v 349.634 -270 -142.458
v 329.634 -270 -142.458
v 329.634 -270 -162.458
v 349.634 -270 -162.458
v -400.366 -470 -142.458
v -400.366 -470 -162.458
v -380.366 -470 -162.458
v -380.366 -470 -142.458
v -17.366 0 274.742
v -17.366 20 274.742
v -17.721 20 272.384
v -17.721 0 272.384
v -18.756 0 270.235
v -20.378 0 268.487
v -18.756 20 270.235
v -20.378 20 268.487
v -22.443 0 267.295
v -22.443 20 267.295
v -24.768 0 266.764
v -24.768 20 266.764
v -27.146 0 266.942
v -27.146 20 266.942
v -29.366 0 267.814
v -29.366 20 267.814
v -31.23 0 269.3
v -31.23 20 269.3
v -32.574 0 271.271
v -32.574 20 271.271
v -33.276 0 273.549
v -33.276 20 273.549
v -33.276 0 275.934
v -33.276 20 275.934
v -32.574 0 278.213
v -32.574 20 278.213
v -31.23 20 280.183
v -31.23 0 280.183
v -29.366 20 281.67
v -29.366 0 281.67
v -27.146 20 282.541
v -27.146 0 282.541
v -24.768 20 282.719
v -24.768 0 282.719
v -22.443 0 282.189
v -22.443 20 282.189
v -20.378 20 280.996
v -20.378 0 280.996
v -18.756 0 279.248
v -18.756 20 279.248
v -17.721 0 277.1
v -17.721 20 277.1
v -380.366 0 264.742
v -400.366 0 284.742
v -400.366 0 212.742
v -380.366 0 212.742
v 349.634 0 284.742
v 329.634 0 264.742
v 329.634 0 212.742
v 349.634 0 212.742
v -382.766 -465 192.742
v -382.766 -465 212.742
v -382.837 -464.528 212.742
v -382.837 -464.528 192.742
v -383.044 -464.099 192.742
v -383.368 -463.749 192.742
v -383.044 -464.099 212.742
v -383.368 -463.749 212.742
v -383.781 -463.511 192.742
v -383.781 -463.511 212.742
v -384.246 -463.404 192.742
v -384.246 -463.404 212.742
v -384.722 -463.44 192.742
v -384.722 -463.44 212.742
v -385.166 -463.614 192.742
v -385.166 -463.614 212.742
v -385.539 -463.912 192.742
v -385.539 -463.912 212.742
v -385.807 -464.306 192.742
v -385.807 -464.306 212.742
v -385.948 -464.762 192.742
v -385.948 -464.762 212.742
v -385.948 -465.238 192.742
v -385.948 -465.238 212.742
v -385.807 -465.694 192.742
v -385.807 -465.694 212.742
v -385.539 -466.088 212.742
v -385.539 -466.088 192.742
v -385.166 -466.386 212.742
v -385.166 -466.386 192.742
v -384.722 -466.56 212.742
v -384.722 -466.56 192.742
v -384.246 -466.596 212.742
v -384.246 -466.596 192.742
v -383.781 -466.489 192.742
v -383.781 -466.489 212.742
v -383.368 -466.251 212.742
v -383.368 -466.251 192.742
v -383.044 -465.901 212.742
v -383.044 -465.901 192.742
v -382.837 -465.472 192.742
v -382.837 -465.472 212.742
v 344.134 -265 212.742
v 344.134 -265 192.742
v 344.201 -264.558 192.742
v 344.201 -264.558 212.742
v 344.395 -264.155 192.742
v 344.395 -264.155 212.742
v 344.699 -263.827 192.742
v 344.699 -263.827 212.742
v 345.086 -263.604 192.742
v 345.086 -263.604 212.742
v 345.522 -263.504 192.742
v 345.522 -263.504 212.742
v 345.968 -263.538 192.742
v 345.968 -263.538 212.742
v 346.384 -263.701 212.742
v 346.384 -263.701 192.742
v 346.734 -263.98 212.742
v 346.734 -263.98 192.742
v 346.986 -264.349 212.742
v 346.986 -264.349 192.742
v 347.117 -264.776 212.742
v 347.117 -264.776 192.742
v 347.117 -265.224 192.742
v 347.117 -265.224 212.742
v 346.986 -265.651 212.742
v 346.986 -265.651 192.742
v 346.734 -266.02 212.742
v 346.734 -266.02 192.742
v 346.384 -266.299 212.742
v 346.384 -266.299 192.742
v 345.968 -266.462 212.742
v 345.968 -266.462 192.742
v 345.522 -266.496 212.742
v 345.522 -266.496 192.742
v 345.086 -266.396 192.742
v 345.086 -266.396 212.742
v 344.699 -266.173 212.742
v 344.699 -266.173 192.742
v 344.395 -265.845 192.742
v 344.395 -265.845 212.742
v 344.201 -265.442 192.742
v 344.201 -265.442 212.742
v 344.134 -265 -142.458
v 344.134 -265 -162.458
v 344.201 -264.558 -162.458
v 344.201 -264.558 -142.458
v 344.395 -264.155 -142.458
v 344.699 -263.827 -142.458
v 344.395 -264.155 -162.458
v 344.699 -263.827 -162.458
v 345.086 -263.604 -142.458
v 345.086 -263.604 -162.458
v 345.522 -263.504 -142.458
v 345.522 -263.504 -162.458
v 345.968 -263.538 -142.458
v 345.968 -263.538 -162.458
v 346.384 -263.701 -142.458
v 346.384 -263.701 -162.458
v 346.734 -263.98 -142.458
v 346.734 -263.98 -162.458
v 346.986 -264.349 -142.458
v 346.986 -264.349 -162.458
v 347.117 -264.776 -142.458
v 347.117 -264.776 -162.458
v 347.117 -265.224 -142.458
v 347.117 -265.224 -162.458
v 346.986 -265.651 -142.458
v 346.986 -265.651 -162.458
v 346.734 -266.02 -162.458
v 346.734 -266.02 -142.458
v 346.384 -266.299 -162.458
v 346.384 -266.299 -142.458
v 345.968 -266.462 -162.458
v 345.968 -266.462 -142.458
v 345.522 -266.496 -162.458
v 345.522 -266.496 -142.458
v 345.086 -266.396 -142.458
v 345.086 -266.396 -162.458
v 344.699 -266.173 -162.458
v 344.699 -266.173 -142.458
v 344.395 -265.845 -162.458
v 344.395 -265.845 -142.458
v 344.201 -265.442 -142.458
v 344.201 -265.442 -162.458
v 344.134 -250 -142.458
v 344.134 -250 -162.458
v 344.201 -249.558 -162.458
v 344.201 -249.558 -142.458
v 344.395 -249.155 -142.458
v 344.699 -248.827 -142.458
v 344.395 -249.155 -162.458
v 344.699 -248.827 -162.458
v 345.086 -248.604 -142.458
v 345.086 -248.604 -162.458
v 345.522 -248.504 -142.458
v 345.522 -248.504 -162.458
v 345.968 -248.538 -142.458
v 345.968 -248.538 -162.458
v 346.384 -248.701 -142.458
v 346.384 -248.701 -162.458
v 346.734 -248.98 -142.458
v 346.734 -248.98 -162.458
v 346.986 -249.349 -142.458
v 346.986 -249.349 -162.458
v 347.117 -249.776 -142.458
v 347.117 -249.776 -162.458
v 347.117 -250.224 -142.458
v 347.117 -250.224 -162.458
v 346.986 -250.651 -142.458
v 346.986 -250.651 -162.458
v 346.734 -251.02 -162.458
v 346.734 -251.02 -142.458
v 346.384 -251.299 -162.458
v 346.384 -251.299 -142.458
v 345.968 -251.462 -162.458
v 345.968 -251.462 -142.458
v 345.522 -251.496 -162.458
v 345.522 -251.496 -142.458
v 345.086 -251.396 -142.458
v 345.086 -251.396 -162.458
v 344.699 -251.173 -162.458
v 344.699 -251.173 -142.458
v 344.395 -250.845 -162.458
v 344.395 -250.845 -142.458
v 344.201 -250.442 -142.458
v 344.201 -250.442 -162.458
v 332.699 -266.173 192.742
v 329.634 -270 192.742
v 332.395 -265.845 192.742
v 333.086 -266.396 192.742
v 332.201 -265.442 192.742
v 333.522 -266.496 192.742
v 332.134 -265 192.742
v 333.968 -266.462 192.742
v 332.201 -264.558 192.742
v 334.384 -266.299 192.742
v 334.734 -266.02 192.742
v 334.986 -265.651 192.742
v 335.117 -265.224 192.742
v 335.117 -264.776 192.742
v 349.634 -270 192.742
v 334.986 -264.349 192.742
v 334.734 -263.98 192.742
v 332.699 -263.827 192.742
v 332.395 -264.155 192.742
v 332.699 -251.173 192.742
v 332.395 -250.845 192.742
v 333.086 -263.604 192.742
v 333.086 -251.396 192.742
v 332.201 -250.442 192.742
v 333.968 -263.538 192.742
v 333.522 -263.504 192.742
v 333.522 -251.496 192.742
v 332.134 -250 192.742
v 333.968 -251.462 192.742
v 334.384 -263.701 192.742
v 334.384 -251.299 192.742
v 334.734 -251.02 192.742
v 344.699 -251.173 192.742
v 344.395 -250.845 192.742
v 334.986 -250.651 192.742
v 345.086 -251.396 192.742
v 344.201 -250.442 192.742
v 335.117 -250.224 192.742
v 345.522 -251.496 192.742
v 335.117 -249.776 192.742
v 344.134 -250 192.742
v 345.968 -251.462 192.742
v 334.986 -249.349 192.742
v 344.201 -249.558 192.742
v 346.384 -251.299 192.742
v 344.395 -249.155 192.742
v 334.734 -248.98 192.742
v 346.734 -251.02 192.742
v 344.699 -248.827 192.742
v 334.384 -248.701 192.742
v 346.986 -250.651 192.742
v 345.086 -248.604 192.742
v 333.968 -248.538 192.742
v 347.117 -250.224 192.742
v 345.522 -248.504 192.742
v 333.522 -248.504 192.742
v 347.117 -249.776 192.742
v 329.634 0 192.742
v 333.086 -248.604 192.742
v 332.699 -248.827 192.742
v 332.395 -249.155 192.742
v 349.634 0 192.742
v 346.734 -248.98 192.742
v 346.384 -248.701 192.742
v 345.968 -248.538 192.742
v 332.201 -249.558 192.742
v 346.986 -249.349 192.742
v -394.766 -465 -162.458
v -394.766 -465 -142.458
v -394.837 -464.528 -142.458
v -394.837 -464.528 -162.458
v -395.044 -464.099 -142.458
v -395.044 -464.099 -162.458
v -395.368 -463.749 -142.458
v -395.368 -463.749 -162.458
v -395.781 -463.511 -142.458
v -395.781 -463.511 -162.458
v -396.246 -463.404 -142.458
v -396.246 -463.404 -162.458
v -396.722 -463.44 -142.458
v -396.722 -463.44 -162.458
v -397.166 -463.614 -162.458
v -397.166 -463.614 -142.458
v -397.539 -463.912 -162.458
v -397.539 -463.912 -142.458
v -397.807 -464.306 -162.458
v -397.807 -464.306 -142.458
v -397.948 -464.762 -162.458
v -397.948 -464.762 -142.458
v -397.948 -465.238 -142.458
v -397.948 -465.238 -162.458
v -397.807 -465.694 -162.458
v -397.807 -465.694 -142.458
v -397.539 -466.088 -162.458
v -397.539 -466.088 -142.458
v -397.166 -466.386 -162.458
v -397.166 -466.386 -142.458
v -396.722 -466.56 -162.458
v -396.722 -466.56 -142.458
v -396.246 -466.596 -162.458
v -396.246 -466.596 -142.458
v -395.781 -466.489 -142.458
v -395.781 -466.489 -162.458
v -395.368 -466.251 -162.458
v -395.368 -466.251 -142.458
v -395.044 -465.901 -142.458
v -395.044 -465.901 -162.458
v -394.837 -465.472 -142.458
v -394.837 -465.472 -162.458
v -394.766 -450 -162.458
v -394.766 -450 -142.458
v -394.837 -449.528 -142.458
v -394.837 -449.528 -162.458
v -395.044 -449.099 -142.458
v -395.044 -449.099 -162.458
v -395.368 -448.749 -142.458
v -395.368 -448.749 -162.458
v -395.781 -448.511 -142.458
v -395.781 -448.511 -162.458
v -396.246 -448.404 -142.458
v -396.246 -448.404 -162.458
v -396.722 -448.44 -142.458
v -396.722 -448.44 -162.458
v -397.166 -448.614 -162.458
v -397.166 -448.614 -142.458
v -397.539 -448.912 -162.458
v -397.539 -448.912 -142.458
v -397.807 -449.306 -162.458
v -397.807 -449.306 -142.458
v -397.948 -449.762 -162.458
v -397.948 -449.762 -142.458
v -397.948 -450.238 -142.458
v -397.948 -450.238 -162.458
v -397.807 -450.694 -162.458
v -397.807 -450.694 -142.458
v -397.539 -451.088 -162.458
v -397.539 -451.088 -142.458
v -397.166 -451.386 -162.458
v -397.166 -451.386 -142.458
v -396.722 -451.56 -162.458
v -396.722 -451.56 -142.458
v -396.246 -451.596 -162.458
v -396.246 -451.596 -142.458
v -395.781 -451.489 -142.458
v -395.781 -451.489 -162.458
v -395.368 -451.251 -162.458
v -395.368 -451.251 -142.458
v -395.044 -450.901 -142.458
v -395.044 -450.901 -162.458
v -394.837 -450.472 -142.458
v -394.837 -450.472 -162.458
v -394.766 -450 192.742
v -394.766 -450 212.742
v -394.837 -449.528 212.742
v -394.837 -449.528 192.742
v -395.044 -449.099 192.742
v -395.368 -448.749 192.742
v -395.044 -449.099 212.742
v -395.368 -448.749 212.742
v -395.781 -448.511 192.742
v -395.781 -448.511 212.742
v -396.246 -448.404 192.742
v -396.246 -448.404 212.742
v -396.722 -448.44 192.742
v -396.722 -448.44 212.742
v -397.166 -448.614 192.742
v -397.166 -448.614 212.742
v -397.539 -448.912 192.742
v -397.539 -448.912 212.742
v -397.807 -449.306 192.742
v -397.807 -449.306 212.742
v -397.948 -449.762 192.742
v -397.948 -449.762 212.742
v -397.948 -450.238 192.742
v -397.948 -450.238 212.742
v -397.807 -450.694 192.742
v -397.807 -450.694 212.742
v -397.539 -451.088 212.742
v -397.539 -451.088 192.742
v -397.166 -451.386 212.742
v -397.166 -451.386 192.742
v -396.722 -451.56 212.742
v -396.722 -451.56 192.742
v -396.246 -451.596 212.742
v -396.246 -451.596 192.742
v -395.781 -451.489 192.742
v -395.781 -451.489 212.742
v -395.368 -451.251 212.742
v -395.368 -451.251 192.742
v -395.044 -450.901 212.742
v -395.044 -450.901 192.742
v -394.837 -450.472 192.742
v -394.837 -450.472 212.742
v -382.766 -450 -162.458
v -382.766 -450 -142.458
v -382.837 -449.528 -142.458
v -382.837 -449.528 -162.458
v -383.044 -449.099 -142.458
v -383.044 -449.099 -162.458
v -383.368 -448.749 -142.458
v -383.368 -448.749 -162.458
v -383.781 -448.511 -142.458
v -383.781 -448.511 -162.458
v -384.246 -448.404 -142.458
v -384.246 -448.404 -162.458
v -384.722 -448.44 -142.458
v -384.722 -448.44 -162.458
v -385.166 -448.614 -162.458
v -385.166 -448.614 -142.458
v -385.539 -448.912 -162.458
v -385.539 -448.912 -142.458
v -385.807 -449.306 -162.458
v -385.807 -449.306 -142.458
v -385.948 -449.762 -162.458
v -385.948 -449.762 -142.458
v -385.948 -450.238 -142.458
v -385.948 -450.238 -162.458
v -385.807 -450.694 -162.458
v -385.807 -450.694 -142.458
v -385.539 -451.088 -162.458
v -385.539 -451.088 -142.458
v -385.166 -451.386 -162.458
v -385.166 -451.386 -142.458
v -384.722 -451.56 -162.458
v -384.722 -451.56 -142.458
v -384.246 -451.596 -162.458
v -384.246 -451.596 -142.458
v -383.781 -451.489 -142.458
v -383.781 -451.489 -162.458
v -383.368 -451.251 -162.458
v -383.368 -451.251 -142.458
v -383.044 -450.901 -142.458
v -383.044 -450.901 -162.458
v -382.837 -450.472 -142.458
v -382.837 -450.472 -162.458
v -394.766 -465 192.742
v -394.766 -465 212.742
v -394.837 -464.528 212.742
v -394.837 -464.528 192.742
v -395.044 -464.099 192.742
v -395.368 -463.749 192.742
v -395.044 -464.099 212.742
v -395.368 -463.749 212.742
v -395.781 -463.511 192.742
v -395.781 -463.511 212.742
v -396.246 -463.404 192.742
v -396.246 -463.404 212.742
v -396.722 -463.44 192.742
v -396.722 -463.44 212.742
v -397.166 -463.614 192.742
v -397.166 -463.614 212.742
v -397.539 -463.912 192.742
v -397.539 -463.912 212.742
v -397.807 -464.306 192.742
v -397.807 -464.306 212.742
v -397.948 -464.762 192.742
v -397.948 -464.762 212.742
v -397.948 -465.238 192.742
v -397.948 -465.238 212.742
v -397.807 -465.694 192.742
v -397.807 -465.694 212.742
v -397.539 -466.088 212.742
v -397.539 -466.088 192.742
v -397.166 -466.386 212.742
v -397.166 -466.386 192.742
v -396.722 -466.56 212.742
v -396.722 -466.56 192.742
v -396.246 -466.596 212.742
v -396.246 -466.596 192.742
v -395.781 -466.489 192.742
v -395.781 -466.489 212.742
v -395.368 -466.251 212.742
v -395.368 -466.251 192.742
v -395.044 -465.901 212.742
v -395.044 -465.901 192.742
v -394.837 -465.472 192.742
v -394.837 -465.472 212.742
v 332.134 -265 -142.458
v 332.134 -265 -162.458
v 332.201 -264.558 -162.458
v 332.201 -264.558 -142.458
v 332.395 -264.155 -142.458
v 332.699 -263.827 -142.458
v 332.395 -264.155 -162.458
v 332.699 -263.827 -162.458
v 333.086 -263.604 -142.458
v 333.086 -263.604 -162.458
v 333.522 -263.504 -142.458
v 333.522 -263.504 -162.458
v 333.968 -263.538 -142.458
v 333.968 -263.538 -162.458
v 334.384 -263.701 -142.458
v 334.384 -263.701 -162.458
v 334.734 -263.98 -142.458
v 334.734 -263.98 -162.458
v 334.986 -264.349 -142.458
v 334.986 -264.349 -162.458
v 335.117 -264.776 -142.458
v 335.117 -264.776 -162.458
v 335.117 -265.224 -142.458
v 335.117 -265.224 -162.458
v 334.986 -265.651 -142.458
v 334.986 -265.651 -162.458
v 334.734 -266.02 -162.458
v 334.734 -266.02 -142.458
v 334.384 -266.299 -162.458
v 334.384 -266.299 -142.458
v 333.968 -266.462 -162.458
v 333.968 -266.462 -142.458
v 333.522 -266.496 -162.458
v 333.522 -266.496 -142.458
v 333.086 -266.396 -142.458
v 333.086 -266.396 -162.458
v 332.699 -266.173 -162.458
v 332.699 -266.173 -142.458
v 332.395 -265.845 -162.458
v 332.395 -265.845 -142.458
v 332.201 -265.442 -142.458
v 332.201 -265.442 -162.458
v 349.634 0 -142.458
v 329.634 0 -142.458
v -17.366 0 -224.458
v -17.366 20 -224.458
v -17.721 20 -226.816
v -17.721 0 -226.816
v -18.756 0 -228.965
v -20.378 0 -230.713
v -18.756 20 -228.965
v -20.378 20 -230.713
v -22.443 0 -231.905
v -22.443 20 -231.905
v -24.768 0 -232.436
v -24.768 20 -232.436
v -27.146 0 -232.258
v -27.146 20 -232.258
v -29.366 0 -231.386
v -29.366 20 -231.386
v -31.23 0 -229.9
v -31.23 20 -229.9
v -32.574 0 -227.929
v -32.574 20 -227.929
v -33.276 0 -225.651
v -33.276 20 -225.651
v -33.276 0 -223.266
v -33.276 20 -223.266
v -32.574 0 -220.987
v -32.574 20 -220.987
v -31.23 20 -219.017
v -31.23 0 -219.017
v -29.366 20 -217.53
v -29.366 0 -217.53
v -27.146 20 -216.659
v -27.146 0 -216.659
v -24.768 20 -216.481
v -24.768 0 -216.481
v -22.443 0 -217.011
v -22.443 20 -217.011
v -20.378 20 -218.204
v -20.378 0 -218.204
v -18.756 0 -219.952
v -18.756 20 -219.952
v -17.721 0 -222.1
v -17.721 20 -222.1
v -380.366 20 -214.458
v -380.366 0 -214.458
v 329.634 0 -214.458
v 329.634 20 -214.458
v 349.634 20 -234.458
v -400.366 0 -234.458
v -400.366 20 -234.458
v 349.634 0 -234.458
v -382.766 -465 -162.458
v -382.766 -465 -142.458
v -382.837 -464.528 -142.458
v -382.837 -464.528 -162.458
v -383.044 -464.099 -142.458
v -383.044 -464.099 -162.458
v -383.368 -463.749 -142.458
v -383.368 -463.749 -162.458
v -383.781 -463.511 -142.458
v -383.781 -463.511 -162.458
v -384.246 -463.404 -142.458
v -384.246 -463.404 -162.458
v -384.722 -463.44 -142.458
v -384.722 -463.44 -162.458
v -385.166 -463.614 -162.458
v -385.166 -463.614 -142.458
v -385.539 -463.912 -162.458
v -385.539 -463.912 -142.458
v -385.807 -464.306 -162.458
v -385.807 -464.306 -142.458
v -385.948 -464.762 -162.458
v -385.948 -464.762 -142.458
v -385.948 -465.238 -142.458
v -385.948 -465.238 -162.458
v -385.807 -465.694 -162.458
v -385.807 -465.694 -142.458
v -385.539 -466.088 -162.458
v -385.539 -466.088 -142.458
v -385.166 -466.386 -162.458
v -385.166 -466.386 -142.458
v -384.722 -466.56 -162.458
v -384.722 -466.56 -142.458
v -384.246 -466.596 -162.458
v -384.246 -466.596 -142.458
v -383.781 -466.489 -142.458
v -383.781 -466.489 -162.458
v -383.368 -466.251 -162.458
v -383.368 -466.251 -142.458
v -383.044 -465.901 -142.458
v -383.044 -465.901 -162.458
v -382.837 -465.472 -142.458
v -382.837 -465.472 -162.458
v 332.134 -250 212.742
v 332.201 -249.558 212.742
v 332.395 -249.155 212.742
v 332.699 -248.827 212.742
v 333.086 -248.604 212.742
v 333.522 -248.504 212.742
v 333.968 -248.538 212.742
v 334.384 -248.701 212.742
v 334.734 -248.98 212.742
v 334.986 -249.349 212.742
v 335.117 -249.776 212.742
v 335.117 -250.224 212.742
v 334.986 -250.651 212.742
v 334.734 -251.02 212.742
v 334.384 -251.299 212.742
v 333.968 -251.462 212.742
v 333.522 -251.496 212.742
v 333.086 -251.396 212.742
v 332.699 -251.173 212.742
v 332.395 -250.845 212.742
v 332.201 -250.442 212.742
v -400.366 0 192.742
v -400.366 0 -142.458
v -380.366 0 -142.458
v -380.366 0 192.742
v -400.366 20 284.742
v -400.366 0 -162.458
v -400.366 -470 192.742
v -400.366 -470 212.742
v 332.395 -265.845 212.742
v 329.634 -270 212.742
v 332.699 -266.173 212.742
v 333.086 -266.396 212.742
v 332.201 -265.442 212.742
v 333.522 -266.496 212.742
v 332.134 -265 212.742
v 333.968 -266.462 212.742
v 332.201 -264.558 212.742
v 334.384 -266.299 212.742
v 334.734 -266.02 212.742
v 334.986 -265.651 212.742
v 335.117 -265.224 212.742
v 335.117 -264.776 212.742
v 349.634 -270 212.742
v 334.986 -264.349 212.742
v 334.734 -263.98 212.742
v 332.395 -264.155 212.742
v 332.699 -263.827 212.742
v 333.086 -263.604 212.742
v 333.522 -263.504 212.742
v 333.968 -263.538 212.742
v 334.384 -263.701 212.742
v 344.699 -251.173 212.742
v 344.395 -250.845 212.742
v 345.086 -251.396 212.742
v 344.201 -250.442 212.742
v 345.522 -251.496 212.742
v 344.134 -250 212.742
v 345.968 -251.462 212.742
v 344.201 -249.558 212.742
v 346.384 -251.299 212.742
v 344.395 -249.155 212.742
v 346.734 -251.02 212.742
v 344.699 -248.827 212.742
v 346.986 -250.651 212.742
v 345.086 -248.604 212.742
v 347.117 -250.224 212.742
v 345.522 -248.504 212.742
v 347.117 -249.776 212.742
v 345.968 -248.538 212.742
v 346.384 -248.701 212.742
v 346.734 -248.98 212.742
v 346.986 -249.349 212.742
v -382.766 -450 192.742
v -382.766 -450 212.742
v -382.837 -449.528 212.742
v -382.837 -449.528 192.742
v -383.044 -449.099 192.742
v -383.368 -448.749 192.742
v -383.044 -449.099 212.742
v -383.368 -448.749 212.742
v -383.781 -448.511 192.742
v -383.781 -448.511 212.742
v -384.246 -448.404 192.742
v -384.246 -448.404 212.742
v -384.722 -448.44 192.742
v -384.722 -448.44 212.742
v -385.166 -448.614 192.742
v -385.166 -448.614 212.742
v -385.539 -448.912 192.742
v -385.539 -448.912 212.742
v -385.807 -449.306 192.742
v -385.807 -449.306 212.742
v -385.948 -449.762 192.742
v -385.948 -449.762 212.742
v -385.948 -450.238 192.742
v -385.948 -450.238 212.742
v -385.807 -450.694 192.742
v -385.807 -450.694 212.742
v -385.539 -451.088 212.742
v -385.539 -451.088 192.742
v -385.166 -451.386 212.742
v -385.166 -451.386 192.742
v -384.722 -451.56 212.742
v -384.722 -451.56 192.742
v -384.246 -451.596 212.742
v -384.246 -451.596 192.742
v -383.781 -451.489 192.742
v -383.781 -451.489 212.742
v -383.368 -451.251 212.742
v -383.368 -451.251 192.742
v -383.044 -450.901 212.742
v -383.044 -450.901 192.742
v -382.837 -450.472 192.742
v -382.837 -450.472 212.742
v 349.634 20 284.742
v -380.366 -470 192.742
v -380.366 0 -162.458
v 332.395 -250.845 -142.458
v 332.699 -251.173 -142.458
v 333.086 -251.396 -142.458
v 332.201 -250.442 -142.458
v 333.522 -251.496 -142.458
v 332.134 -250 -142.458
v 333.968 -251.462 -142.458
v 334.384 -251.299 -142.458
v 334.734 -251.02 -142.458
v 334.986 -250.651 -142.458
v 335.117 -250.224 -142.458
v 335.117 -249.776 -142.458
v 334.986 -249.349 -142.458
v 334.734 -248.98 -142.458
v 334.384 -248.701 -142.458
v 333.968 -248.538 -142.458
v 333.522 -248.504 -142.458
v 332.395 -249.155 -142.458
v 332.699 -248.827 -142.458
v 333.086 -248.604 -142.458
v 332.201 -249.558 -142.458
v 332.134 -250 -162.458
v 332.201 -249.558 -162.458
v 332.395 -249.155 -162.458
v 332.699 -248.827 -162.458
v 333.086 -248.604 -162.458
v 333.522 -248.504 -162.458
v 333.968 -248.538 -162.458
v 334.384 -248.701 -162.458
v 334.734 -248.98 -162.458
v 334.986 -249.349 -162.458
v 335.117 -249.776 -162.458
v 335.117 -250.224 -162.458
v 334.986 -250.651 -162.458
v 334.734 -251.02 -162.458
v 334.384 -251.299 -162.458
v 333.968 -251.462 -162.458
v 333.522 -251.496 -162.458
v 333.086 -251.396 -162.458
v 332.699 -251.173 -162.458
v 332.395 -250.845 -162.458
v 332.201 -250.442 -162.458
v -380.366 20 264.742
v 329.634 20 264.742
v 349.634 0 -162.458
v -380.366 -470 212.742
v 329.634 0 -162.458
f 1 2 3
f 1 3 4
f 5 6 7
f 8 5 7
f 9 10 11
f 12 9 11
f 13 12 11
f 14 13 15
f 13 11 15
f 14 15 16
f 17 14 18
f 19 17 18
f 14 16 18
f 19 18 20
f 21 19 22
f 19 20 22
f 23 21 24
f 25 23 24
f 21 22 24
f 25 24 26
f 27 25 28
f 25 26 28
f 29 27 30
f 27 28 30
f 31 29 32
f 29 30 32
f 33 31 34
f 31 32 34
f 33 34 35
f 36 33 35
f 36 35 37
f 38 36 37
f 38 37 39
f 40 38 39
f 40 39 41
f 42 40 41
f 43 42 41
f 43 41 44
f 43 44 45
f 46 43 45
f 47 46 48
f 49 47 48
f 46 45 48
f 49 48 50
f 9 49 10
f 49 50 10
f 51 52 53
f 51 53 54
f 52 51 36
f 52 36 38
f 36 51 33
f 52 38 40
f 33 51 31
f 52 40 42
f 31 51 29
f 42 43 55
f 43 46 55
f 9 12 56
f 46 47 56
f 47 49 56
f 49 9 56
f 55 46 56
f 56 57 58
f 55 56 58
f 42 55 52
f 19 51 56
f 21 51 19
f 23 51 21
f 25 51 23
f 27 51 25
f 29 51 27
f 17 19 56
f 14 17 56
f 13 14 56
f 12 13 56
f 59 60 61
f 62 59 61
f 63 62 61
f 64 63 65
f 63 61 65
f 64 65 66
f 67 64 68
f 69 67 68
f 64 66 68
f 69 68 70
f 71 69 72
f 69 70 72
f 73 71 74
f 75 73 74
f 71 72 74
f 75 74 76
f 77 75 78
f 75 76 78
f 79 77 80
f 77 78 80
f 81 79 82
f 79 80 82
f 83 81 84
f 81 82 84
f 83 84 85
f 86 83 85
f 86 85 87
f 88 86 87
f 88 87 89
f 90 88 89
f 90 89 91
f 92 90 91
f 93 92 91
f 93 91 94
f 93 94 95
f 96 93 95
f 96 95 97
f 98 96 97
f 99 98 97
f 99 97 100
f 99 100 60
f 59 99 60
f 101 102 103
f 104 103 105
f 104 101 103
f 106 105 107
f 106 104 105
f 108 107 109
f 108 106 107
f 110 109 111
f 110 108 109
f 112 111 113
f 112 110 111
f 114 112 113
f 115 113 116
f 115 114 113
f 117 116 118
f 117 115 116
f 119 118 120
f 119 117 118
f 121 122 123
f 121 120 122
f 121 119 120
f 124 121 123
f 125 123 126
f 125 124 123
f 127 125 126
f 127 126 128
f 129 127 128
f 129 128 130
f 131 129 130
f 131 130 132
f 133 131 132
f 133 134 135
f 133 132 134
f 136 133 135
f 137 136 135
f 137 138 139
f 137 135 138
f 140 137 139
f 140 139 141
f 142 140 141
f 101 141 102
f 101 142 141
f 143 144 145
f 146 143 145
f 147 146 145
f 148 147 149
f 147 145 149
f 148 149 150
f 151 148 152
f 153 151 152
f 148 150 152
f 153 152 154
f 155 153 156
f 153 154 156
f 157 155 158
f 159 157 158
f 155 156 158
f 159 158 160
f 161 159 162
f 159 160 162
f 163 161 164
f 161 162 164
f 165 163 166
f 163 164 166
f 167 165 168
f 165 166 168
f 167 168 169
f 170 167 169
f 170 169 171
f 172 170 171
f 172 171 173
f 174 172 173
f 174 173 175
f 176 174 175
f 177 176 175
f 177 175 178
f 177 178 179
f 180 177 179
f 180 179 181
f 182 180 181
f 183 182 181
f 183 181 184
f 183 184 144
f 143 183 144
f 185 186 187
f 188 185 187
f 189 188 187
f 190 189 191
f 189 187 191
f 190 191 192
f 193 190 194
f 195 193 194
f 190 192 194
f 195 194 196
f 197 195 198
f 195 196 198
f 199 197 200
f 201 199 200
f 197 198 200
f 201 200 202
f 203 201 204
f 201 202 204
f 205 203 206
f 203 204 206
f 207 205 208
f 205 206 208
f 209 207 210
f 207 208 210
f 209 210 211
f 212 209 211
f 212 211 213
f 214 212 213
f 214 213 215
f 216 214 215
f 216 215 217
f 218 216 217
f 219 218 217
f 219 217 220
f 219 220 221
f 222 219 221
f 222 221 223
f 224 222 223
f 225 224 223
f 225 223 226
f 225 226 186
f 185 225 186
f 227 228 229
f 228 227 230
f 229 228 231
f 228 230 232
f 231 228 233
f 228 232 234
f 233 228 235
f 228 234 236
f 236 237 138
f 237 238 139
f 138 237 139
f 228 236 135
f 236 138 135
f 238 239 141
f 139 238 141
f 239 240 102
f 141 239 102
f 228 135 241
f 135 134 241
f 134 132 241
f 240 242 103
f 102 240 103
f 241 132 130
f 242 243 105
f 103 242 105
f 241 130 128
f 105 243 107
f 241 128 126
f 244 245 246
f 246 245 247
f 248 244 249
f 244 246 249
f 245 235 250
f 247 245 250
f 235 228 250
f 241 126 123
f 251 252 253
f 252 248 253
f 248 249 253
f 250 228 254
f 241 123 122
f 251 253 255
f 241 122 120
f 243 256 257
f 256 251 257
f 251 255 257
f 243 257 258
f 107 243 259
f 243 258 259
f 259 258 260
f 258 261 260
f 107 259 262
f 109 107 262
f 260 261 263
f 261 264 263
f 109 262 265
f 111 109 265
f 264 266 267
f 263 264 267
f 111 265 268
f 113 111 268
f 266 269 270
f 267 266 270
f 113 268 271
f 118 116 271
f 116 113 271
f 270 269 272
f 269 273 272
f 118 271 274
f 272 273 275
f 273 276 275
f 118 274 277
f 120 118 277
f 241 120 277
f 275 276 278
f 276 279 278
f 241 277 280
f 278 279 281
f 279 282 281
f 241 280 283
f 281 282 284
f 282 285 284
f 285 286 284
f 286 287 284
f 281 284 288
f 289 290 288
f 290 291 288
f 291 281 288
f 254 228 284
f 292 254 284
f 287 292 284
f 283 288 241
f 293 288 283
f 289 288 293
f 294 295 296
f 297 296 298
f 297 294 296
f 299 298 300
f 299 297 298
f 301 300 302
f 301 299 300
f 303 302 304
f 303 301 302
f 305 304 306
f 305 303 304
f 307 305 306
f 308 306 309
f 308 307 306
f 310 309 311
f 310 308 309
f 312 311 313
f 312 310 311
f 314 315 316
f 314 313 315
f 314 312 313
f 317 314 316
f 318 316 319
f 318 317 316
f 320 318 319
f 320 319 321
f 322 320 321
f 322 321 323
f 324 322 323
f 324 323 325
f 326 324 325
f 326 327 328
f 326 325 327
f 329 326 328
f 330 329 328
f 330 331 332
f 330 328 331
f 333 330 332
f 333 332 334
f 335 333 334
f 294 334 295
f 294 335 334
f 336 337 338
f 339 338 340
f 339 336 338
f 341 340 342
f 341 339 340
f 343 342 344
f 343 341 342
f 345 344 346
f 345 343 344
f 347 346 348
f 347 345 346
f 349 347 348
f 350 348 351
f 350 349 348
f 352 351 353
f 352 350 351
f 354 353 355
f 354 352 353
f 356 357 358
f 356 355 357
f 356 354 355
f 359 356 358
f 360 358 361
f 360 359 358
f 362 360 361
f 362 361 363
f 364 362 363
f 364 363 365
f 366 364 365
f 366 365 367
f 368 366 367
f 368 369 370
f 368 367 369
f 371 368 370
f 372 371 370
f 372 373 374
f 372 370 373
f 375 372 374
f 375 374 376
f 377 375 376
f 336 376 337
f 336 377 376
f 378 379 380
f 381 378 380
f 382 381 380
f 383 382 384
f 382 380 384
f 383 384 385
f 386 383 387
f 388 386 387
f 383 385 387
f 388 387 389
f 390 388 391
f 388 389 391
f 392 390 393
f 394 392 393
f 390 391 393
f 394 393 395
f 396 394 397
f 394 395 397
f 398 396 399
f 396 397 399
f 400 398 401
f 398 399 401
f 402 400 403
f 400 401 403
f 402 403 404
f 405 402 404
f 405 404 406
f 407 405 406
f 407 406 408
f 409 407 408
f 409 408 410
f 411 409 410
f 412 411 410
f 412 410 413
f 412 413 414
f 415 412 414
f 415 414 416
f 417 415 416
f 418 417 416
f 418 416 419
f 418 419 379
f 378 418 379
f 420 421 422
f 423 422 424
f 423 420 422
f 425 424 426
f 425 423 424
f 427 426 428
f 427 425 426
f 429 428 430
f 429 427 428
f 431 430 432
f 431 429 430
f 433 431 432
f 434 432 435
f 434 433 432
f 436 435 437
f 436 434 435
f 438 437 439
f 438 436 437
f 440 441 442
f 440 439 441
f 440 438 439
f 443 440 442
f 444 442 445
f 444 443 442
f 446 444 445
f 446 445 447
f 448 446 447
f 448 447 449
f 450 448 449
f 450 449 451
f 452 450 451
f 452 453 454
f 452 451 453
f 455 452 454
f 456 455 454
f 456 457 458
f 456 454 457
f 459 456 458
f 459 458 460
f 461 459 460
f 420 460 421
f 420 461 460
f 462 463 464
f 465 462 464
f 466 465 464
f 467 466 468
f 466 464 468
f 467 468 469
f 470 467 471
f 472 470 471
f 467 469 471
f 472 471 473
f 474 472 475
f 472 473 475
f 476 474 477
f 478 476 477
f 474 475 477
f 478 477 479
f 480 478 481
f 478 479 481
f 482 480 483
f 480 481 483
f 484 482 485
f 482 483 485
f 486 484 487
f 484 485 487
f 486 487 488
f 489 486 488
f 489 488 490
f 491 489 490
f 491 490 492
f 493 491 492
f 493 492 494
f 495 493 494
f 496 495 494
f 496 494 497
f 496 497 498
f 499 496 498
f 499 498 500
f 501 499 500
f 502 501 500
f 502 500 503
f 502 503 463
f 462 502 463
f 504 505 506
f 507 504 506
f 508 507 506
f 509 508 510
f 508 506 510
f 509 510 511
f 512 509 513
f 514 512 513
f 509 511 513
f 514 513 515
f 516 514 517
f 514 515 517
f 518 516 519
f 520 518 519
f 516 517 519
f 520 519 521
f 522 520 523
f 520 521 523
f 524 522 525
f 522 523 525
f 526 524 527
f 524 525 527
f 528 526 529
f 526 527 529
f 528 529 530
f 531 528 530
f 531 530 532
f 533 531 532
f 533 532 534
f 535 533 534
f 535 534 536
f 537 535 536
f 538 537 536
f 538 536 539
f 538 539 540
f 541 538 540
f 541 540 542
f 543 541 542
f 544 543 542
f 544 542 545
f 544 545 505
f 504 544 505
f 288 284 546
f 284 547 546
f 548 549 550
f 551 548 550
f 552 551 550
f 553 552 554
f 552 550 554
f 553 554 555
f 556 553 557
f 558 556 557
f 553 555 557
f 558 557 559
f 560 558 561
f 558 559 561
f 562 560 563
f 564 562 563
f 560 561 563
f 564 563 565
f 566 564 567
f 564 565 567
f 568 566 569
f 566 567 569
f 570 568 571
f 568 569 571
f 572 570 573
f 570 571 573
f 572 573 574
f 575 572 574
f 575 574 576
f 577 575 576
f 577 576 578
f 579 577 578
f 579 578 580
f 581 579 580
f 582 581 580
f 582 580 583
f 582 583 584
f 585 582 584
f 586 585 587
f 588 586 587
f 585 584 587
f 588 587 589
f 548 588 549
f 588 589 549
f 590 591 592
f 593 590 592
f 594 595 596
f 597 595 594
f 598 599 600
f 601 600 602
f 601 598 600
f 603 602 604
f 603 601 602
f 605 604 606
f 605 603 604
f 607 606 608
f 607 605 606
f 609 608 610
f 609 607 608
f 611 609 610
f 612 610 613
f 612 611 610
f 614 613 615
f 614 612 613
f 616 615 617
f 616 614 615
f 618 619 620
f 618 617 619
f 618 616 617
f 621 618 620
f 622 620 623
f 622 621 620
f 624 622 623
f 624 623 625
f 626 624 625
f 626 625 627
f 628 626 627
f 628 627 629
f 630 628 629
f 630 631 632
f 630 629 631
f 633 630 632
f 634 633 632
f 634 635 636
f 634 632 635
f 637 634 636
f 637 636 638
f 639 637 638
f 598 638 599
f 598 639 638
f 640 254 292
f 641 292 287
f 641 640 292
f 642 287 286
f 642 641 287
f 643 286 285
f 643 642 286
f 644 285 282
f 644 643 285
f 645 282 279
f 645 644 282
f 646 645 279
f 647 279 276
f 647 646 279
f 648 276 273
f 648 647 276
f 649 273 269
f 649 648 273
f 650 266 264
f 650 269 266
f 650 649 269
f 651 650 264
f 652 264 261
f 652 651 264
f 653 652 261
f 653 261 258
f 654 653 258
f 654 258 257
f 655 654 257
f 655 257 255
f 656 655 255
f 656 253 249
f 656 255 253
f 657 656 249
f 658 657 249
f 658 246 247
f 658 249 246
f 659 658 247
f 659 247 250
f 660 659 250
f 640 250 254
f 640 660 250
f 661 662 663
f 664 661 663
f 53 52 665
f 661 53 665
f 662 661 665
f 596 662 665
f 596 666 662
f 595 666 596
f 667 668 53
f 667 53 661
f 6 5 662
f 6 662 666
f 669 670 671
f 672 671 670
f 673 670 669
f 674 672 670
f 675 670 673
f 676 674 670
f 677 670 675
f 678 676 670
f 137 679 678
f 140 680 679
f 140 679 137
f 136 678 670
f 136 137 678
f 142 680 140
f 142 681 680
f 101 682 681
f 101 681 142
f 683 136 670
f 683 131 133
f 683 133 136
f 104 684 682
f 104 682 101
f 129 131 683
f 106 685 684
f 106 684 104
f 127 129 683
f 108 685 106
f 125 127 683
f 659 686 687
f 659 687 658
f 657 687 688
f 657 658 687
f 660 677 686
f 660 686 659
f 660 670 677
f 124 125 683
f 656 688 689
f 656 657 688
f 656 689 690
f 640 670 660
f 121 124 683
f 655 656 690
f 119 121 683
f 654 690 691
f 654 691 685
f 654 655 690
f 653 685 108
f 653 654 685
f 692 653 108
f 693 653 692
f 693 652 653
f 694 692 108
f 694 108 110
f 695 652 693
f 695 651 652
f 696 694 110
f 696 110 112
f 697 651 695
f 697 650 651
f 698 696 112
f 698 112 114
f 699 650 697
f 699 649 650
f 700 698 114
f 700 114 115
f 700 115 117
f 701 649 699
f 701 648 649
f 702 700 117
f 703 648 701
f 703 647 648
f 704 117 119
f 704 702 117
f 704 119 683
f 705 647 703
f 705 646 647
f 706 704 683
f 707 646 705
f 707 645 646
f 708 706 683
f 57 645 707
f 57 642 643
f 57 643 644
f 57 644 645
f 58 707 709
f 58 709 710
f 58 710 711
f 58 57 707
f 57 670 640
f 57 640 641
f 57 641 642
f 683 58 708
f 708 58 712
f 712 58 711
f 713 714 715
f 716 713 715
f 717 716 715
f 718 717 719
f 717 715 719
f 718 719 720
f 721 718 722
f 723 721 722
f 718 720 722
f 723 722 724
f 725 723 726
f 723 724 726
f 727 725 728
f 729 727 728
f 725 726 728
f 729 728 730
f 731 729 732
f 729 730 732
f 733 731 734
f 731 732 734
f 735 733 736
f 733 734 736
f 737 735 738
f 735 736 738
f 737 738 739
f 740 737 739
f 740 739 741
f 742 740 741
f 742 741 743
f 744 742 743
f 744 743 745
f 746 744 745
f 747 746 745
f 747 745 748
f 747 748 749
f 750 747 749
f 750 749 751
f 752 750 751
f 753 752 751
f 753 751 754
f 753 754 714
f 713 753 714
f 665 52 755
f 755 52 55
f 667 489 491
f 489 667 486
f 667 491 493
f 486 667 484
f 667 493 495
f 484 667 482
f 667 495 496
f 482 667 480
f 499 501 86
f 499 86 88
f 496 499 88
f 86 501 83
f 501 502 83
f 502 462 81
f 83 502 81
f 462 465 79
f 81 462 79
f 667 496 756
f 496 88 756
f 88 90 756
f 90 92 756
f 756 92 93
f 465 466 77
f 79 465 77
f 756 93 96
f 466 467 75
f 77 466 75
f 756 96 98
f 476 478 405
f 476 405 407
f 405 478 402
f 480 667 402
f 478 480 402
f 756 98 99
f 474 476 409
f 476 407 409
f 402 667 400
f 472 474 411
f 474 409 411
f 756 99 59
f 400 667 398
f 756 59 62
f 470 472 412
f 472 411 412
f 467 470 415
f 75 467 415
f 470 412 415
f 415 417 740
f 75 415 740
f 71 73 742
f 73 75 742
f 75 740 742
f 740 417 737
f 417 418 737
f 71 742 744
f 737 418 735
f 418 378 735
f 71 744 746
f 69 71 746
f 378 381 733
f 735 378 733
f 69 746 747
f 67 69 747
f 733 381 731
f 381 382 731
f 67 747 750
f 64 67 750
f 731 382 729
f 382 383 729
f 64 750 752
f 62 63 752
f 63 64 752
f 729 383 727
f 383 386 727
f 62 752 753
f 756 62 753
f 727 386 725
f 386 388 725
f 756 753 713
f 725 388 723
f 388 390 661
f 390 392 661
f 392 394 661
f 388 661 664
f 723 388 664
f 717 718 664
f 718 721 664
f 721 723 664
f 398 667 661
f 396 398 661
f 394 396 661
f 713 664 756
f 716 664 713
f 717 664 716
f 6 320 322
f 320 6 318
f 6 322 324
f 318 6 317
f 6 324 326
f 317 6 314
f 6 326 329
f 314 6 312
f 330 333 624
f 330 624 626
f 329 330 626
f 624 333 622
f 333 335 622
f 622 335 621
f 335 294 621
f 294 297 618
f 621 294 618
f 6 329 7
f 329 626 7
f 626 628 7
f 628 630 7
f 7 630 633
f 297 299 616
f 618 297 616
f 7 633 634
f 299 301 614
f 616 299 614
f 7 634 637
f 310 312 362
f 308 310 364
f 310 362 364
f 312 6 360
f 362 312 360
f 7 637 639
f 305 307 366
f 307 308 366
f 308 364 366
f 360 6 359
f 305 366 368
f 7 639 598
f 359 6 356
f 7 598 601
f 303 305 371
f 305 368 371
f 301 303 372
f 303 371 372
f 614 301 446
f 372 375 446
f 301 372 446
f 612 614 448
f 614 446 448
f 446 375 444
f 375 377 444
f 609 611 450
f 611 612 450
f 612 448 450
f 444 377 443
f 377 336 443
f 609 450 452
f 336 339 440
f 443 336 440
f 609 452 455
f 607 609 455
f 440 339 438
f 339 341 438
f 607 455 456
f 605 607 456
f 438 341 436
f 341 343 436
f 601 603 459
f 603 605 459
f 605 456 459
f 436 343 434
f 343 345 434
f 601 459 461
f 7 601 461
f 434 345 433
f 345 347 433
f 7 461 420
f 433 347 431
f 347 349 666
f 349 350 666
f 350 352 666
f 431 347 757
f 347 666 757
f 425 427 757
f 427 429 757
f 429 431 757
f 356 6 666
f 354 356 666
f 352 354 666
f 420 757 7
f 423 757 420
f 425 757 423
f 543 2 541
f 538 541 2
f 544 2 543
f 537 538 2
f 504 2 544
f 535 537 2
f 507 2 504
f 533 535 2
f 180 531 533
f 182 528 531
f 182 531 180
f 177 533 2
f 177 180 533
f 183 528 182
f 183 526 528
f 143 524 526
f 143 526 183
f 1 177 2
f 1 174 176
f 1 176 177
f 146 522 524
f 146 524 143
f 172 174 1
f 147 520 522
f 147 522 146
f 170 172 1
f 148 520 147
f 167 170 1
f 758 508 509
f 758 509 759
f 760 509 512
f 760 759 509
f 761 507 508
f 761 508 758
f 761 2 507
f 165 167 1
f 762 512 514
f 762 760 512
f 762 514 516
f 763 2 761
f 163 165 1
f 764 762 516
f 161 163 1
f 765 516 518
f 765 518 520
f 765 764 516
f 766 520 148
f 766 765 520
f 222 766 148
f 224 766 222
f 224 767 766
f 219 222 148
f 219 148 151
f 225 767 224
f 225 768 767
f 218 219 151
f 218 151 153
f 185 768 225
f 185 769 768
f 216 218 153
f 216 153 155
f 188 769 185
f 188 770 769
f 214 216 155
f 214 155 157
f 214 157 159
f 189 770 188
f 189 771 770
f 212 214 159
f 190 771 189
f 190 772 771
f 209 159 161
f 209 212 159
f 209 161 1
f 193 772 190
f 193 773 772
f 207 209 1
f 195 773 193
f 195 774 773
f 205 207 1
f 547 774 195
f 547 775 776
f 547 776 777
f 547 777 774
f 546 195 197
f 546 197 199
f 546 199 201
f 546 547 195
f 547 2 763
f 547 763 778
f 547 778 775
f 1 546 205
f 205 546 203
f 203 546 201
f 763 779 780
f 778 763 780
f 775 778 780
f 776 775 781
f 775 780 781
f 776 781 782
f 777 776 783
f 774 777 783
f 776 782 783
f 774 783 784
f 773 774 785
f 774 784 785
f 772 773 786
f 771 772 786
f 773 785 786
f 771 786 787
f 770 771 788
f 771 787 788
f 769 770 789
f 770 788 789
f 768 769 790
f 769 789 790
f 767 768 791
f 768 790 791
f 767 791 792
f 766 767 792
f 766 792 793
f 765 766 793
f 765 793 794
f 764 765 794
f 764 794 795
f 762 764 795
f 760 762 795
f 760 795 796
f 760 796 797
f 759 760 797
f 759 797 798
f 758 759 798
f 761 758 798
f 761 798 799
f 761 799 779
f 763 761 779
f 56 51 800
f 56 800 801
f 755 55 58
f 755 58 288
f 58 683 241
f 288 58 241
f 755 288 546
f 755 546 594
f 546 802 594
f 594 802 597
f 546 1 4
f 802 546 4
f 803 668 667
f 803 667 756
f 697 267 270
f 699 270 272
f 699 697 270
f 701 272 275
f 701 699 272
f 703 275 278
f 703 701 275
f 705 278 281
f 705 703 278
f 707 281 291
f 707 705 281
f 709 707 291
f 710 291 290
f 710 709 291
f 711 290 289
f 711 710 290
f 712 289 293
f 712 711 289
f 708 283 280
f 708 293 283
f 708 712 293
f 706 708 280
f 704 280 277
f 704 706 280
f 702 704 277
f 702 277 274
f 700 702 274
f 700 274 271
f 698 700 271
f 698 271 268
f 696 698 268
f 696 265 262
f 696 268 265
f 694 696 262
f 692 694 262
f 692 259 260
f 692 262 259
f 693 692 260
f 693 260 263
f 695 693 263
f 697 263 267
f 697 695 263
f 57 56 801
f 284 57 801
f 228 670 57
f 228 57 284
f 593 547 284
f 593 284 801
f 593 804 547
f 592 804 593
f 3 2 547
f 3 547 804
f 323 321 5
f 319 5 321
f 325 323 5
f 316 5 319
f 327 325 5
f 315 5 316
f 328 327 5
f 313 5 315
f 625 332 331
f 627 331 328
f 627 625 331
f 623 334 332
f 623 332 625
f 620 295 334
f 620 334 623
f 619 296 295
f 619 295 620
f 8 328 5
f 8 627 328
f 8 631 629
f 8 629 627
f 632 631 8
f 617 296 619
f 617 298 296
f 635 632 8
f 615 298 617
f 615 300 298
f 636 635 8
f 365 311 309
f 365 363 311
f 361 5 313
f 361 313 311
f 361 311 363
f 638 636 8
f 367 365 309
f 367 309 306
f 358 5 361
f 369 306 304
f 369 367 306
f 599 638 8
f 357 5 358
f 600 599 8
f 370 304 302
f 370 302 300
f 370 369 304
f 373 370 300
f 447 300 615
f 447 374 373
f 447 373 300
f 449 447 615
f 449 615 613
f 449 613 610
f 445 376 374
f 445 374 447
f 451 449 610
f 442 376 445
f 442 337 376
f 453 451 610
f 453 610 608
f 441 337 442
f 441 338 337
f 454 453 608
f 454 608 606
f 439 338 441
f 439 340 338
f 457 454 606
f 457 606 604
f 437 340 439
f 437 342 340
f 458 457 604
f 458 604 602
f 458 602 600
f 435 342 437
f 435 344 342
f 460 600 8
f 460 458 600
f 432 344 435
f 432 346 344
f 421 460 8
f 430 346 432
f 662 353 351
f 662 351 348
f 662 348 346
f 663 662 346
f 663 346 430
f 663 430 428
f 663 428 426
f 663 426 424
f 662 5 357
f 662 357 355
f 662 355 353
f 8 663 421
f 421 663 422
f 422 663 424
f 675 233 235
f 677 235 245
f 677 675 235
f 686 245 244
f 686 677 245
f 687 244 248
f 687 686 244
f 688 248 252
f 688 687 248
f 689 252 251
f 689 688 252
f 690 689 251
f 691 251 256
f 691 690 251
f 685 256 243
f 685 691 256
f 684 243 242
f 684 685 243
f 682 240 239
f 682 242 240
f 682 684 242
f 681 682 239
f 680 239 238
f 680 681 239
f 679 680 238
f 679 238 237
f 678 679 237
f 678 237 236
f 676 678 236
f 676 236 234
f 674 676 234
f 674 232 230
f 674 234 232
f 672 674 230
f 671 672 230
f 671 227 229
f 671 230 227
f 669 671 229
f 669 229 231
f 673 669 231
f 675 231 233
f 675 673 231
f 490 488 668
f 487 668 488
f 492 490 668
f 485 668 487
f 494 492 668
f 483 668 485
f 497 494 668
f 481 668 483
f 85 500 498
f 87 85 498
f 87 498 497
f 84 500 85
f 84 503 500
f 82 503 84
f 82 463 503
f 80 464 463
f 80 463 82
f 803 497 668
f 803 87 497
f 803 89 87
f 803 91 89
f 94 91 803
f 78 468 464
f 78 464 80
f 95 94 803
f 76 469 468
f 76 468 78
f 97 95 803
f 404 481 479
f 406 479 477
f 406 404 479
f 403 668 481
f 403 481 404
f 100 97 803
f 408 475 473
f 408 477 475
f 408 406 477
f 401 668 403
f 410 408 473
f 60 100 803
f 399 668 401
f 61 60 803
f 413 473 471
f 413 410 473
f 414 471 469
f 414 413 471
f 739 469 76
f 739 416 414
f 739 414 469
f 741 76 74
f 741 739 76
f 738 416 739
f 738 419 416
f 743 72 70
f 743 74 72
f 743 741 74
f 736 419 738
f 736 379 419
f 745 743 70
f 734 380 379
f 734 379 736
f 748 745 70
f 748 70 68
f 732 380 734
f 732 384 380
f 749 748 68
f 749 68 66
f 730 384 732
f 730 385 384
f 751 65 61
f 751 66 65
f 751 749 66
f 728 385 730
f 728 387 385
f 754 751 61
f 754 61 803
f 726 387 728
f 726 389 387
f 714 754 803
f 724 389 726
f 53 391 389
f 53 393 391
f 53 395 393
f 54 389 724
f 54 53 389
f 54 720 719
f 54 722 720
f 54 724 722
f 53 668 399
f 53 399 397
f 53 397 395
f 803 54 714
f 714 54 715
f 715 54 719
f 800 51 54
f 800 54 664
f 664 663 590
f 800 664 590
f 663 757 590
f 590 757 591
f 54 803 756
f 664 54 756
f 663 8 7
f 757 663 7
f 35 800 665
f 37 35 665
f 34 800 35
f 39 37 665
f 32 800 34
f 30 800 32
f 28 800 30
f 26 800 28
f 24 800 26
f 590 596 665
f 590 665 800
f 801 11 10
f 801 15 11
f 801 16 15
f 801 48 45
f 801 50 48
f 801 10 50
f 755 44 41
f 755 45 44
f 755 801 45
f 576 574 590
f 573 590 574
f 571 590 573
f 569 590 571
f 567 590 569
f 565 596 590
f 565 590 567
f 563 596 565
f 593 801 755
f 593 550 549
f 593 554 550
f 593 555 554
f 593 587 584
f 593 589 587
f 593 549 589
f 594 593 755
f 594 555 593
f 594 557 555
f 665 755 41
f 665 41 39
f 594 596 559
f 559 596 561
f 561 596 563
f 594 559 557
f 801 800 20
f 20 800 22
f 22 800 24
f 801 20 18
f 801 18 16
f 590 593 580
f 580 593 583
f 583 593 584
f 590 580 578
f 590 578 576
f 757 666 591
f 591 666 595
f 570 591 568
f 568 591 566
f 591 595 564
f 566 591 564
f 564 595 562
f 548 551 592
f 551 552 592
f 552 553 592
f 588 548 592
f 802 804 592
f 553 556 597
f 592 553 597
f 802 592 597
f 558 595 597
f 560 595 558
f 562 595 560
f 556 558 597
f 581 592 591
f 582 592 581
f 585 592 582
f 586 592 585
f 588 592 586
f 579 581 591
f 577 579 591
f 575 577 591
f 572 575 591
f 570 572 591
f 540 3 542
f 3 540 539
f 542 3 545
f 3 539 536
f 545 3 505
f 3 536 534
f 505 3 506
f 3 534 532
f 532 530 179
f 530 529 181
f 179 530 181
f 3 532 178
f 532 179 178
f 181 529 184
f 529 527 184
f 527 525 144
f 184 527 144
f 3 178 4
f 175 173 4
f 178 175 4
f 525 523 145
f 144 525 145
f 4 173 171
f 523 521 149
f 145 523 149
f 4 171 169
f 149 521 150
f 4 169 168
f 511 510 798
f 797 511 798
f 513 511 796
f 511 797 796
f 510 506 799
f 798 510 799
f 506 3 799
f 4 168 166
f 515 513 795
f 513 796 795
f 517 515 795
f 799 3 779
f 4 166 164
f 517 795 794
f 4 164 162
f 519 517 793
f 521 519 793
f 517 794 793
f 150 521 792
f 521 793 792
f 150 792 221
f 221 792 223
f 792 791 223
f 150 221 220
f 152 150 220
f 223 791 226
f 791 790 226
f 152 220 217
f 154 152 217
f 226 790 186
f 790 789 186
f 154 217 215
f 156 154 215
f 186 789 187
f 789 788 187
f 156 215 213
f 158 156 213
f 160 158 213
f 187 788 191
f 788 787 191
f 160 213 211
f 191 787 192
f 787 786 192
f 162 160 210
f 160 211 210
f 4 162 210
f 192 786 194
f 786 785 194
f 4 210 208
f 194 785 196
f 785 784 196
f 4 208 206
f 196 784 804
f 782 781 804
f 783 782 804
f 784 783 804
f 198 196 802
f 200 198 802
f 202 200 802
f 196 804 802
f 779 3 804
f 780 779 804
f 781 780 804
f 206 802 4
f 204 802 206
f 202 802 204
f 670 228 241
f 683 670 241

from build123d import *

# Parameters (mm, degrees)
SKETCH_1_W      = 750
SKETCH_1_H      = 519.2
SKETCH_1_W_2    = 710
SKETCH_1_H_2    = 479.2
EXTRUDE_1_DEPTH = 20
SKETCH_2_W      = 20
SKETCH_2_H      = 20
EXTRUDE_2_DEPTH = 470
SKETCH_6_W      = 20
SKETCH_6_H      = 20
EXTRUDE_4_DEPTH = 270
SKETCH_4_R      = 1.6
EXTRUDE1_DEPTH  = 30
SKETCH_7_R      = 1.5
EXTRUDE2_DEPTH  = 30
SKETCH1_R       = 8
EXTRUDE3_DEPTH  = 20


with BuildPart() as part:
    # 草图1 → 凸台-拉伸1 (new body)
    with BuildSketch(Plane(origin=(0, 0, 0), x_dir=(1, 0, 0), z_dir=(0, 1, 0))):
        with Locations((-25.365803698, -25.141816005)):
            Rectangle(SKETCH_1_W, SKETCH_1_H)
        with Locations((-25.365803698, -25.141816005)):
            Rectangle(SKETCH_1_W_2, SKETCH_1_H_2, mode=Mode.SUBTRACT)
    extrude(amount=EXTRUDE_1_DEPTH)

    # 草图2 → 凸台-拉伸2 (add)
    with BuildSketch(Plane.XZ):
        with Locations((-390.365803698, 202.741816005)):
            Rectangle(SKETCH_2_W, SKETCH_2_H)
    extrude_2 = extrude(amount=EXTRUDE_2_DEPTH)

    # 草图6 → 凸台-拉伸4 (add)
    with BuildSketch(Plane.XZ):
        with Locations((339.634196302, -152.458183995)):
            Rectangle(SKETCH_6_W, SKETCH_6_H)
    extrude_4 = extrude(amount=EXTRUDE_4_DEPTH)

    # 草图4 → Extrude1 (cut)
    with BuildSketch(Plane.XY.offset(212.741816005)):
        with Locations((-396.365803698, -465)):
            Circle(SKETCH_4_R)
        with Locations((-384.365803698, -465)):
            Circle(SKETCH_4_R)
        with Locations((-396.365803698, -450)):
            Circle(SKETCH_4_R)
        with Locations((-384.365803698, -450)):
            Circle(SKETCH_4_R)
    extrude1 = extrude(amount=-EXTRUDE1_DEPTH, mode=Mode.SUBTRACT)

    # 草图7 → Extrude2 (cut)
    with BuildSketch(Plane(origin=(0, 0, -162.458183995), x_dir=(-1, 0, 0), z_dir=(0, 0, -1))):
        with Locations((-345.634196302, -265)):
            Circle(SKETCH_7_R)
        with Locations((-333.634196302, -265)):
            Circle(SKETCH_7_R)
        with Locations((-345.634196302, -250)):
            Circle(SKETCH_7_R)
        with Locations((-333.634196302, -250)):
            Circle(SKETCH_7_R)
    extrude2 = extrude(amount=-EXTRUDE2_DEPTH, mode=Mode.SUBTRACT)

    # Mirror1: 凸台-拉伸2, 凸台-拉伸4, Extrude1, Extrude2 across plane
    add(extrude_2.mirror(Plane.XY.offset(25.141816005)))
    add(extrude_4.mirror(Plane.XY.offset(25.141816005)))
    add(extrude1.mirror(Plane.XY.offset(25.141816005)), mode=Mode.SUBTRACT)
    add(extrude2.mirror(Plane.XY.offset(25.141816005)), mode=Mode.SUBTRACT)

    # Sketch1 → Extrude3 (cut)
    with BuildSketch(Plane(origin=(0, 20, 0), x_dir=(1, 0, 0), z_dir=(0, 1, 0))):
        with Locations((-25.365803698, 224.458183995)):
            Circle(SKETCH1_R)
        with Locations((-25.365803698, -274.741816005)):
            Circle(SKETCH1_R)
    extrude(amount=-EXTRUDE3_DEPTH, mode=Mode.SUBTRACT)


solid = part.part
